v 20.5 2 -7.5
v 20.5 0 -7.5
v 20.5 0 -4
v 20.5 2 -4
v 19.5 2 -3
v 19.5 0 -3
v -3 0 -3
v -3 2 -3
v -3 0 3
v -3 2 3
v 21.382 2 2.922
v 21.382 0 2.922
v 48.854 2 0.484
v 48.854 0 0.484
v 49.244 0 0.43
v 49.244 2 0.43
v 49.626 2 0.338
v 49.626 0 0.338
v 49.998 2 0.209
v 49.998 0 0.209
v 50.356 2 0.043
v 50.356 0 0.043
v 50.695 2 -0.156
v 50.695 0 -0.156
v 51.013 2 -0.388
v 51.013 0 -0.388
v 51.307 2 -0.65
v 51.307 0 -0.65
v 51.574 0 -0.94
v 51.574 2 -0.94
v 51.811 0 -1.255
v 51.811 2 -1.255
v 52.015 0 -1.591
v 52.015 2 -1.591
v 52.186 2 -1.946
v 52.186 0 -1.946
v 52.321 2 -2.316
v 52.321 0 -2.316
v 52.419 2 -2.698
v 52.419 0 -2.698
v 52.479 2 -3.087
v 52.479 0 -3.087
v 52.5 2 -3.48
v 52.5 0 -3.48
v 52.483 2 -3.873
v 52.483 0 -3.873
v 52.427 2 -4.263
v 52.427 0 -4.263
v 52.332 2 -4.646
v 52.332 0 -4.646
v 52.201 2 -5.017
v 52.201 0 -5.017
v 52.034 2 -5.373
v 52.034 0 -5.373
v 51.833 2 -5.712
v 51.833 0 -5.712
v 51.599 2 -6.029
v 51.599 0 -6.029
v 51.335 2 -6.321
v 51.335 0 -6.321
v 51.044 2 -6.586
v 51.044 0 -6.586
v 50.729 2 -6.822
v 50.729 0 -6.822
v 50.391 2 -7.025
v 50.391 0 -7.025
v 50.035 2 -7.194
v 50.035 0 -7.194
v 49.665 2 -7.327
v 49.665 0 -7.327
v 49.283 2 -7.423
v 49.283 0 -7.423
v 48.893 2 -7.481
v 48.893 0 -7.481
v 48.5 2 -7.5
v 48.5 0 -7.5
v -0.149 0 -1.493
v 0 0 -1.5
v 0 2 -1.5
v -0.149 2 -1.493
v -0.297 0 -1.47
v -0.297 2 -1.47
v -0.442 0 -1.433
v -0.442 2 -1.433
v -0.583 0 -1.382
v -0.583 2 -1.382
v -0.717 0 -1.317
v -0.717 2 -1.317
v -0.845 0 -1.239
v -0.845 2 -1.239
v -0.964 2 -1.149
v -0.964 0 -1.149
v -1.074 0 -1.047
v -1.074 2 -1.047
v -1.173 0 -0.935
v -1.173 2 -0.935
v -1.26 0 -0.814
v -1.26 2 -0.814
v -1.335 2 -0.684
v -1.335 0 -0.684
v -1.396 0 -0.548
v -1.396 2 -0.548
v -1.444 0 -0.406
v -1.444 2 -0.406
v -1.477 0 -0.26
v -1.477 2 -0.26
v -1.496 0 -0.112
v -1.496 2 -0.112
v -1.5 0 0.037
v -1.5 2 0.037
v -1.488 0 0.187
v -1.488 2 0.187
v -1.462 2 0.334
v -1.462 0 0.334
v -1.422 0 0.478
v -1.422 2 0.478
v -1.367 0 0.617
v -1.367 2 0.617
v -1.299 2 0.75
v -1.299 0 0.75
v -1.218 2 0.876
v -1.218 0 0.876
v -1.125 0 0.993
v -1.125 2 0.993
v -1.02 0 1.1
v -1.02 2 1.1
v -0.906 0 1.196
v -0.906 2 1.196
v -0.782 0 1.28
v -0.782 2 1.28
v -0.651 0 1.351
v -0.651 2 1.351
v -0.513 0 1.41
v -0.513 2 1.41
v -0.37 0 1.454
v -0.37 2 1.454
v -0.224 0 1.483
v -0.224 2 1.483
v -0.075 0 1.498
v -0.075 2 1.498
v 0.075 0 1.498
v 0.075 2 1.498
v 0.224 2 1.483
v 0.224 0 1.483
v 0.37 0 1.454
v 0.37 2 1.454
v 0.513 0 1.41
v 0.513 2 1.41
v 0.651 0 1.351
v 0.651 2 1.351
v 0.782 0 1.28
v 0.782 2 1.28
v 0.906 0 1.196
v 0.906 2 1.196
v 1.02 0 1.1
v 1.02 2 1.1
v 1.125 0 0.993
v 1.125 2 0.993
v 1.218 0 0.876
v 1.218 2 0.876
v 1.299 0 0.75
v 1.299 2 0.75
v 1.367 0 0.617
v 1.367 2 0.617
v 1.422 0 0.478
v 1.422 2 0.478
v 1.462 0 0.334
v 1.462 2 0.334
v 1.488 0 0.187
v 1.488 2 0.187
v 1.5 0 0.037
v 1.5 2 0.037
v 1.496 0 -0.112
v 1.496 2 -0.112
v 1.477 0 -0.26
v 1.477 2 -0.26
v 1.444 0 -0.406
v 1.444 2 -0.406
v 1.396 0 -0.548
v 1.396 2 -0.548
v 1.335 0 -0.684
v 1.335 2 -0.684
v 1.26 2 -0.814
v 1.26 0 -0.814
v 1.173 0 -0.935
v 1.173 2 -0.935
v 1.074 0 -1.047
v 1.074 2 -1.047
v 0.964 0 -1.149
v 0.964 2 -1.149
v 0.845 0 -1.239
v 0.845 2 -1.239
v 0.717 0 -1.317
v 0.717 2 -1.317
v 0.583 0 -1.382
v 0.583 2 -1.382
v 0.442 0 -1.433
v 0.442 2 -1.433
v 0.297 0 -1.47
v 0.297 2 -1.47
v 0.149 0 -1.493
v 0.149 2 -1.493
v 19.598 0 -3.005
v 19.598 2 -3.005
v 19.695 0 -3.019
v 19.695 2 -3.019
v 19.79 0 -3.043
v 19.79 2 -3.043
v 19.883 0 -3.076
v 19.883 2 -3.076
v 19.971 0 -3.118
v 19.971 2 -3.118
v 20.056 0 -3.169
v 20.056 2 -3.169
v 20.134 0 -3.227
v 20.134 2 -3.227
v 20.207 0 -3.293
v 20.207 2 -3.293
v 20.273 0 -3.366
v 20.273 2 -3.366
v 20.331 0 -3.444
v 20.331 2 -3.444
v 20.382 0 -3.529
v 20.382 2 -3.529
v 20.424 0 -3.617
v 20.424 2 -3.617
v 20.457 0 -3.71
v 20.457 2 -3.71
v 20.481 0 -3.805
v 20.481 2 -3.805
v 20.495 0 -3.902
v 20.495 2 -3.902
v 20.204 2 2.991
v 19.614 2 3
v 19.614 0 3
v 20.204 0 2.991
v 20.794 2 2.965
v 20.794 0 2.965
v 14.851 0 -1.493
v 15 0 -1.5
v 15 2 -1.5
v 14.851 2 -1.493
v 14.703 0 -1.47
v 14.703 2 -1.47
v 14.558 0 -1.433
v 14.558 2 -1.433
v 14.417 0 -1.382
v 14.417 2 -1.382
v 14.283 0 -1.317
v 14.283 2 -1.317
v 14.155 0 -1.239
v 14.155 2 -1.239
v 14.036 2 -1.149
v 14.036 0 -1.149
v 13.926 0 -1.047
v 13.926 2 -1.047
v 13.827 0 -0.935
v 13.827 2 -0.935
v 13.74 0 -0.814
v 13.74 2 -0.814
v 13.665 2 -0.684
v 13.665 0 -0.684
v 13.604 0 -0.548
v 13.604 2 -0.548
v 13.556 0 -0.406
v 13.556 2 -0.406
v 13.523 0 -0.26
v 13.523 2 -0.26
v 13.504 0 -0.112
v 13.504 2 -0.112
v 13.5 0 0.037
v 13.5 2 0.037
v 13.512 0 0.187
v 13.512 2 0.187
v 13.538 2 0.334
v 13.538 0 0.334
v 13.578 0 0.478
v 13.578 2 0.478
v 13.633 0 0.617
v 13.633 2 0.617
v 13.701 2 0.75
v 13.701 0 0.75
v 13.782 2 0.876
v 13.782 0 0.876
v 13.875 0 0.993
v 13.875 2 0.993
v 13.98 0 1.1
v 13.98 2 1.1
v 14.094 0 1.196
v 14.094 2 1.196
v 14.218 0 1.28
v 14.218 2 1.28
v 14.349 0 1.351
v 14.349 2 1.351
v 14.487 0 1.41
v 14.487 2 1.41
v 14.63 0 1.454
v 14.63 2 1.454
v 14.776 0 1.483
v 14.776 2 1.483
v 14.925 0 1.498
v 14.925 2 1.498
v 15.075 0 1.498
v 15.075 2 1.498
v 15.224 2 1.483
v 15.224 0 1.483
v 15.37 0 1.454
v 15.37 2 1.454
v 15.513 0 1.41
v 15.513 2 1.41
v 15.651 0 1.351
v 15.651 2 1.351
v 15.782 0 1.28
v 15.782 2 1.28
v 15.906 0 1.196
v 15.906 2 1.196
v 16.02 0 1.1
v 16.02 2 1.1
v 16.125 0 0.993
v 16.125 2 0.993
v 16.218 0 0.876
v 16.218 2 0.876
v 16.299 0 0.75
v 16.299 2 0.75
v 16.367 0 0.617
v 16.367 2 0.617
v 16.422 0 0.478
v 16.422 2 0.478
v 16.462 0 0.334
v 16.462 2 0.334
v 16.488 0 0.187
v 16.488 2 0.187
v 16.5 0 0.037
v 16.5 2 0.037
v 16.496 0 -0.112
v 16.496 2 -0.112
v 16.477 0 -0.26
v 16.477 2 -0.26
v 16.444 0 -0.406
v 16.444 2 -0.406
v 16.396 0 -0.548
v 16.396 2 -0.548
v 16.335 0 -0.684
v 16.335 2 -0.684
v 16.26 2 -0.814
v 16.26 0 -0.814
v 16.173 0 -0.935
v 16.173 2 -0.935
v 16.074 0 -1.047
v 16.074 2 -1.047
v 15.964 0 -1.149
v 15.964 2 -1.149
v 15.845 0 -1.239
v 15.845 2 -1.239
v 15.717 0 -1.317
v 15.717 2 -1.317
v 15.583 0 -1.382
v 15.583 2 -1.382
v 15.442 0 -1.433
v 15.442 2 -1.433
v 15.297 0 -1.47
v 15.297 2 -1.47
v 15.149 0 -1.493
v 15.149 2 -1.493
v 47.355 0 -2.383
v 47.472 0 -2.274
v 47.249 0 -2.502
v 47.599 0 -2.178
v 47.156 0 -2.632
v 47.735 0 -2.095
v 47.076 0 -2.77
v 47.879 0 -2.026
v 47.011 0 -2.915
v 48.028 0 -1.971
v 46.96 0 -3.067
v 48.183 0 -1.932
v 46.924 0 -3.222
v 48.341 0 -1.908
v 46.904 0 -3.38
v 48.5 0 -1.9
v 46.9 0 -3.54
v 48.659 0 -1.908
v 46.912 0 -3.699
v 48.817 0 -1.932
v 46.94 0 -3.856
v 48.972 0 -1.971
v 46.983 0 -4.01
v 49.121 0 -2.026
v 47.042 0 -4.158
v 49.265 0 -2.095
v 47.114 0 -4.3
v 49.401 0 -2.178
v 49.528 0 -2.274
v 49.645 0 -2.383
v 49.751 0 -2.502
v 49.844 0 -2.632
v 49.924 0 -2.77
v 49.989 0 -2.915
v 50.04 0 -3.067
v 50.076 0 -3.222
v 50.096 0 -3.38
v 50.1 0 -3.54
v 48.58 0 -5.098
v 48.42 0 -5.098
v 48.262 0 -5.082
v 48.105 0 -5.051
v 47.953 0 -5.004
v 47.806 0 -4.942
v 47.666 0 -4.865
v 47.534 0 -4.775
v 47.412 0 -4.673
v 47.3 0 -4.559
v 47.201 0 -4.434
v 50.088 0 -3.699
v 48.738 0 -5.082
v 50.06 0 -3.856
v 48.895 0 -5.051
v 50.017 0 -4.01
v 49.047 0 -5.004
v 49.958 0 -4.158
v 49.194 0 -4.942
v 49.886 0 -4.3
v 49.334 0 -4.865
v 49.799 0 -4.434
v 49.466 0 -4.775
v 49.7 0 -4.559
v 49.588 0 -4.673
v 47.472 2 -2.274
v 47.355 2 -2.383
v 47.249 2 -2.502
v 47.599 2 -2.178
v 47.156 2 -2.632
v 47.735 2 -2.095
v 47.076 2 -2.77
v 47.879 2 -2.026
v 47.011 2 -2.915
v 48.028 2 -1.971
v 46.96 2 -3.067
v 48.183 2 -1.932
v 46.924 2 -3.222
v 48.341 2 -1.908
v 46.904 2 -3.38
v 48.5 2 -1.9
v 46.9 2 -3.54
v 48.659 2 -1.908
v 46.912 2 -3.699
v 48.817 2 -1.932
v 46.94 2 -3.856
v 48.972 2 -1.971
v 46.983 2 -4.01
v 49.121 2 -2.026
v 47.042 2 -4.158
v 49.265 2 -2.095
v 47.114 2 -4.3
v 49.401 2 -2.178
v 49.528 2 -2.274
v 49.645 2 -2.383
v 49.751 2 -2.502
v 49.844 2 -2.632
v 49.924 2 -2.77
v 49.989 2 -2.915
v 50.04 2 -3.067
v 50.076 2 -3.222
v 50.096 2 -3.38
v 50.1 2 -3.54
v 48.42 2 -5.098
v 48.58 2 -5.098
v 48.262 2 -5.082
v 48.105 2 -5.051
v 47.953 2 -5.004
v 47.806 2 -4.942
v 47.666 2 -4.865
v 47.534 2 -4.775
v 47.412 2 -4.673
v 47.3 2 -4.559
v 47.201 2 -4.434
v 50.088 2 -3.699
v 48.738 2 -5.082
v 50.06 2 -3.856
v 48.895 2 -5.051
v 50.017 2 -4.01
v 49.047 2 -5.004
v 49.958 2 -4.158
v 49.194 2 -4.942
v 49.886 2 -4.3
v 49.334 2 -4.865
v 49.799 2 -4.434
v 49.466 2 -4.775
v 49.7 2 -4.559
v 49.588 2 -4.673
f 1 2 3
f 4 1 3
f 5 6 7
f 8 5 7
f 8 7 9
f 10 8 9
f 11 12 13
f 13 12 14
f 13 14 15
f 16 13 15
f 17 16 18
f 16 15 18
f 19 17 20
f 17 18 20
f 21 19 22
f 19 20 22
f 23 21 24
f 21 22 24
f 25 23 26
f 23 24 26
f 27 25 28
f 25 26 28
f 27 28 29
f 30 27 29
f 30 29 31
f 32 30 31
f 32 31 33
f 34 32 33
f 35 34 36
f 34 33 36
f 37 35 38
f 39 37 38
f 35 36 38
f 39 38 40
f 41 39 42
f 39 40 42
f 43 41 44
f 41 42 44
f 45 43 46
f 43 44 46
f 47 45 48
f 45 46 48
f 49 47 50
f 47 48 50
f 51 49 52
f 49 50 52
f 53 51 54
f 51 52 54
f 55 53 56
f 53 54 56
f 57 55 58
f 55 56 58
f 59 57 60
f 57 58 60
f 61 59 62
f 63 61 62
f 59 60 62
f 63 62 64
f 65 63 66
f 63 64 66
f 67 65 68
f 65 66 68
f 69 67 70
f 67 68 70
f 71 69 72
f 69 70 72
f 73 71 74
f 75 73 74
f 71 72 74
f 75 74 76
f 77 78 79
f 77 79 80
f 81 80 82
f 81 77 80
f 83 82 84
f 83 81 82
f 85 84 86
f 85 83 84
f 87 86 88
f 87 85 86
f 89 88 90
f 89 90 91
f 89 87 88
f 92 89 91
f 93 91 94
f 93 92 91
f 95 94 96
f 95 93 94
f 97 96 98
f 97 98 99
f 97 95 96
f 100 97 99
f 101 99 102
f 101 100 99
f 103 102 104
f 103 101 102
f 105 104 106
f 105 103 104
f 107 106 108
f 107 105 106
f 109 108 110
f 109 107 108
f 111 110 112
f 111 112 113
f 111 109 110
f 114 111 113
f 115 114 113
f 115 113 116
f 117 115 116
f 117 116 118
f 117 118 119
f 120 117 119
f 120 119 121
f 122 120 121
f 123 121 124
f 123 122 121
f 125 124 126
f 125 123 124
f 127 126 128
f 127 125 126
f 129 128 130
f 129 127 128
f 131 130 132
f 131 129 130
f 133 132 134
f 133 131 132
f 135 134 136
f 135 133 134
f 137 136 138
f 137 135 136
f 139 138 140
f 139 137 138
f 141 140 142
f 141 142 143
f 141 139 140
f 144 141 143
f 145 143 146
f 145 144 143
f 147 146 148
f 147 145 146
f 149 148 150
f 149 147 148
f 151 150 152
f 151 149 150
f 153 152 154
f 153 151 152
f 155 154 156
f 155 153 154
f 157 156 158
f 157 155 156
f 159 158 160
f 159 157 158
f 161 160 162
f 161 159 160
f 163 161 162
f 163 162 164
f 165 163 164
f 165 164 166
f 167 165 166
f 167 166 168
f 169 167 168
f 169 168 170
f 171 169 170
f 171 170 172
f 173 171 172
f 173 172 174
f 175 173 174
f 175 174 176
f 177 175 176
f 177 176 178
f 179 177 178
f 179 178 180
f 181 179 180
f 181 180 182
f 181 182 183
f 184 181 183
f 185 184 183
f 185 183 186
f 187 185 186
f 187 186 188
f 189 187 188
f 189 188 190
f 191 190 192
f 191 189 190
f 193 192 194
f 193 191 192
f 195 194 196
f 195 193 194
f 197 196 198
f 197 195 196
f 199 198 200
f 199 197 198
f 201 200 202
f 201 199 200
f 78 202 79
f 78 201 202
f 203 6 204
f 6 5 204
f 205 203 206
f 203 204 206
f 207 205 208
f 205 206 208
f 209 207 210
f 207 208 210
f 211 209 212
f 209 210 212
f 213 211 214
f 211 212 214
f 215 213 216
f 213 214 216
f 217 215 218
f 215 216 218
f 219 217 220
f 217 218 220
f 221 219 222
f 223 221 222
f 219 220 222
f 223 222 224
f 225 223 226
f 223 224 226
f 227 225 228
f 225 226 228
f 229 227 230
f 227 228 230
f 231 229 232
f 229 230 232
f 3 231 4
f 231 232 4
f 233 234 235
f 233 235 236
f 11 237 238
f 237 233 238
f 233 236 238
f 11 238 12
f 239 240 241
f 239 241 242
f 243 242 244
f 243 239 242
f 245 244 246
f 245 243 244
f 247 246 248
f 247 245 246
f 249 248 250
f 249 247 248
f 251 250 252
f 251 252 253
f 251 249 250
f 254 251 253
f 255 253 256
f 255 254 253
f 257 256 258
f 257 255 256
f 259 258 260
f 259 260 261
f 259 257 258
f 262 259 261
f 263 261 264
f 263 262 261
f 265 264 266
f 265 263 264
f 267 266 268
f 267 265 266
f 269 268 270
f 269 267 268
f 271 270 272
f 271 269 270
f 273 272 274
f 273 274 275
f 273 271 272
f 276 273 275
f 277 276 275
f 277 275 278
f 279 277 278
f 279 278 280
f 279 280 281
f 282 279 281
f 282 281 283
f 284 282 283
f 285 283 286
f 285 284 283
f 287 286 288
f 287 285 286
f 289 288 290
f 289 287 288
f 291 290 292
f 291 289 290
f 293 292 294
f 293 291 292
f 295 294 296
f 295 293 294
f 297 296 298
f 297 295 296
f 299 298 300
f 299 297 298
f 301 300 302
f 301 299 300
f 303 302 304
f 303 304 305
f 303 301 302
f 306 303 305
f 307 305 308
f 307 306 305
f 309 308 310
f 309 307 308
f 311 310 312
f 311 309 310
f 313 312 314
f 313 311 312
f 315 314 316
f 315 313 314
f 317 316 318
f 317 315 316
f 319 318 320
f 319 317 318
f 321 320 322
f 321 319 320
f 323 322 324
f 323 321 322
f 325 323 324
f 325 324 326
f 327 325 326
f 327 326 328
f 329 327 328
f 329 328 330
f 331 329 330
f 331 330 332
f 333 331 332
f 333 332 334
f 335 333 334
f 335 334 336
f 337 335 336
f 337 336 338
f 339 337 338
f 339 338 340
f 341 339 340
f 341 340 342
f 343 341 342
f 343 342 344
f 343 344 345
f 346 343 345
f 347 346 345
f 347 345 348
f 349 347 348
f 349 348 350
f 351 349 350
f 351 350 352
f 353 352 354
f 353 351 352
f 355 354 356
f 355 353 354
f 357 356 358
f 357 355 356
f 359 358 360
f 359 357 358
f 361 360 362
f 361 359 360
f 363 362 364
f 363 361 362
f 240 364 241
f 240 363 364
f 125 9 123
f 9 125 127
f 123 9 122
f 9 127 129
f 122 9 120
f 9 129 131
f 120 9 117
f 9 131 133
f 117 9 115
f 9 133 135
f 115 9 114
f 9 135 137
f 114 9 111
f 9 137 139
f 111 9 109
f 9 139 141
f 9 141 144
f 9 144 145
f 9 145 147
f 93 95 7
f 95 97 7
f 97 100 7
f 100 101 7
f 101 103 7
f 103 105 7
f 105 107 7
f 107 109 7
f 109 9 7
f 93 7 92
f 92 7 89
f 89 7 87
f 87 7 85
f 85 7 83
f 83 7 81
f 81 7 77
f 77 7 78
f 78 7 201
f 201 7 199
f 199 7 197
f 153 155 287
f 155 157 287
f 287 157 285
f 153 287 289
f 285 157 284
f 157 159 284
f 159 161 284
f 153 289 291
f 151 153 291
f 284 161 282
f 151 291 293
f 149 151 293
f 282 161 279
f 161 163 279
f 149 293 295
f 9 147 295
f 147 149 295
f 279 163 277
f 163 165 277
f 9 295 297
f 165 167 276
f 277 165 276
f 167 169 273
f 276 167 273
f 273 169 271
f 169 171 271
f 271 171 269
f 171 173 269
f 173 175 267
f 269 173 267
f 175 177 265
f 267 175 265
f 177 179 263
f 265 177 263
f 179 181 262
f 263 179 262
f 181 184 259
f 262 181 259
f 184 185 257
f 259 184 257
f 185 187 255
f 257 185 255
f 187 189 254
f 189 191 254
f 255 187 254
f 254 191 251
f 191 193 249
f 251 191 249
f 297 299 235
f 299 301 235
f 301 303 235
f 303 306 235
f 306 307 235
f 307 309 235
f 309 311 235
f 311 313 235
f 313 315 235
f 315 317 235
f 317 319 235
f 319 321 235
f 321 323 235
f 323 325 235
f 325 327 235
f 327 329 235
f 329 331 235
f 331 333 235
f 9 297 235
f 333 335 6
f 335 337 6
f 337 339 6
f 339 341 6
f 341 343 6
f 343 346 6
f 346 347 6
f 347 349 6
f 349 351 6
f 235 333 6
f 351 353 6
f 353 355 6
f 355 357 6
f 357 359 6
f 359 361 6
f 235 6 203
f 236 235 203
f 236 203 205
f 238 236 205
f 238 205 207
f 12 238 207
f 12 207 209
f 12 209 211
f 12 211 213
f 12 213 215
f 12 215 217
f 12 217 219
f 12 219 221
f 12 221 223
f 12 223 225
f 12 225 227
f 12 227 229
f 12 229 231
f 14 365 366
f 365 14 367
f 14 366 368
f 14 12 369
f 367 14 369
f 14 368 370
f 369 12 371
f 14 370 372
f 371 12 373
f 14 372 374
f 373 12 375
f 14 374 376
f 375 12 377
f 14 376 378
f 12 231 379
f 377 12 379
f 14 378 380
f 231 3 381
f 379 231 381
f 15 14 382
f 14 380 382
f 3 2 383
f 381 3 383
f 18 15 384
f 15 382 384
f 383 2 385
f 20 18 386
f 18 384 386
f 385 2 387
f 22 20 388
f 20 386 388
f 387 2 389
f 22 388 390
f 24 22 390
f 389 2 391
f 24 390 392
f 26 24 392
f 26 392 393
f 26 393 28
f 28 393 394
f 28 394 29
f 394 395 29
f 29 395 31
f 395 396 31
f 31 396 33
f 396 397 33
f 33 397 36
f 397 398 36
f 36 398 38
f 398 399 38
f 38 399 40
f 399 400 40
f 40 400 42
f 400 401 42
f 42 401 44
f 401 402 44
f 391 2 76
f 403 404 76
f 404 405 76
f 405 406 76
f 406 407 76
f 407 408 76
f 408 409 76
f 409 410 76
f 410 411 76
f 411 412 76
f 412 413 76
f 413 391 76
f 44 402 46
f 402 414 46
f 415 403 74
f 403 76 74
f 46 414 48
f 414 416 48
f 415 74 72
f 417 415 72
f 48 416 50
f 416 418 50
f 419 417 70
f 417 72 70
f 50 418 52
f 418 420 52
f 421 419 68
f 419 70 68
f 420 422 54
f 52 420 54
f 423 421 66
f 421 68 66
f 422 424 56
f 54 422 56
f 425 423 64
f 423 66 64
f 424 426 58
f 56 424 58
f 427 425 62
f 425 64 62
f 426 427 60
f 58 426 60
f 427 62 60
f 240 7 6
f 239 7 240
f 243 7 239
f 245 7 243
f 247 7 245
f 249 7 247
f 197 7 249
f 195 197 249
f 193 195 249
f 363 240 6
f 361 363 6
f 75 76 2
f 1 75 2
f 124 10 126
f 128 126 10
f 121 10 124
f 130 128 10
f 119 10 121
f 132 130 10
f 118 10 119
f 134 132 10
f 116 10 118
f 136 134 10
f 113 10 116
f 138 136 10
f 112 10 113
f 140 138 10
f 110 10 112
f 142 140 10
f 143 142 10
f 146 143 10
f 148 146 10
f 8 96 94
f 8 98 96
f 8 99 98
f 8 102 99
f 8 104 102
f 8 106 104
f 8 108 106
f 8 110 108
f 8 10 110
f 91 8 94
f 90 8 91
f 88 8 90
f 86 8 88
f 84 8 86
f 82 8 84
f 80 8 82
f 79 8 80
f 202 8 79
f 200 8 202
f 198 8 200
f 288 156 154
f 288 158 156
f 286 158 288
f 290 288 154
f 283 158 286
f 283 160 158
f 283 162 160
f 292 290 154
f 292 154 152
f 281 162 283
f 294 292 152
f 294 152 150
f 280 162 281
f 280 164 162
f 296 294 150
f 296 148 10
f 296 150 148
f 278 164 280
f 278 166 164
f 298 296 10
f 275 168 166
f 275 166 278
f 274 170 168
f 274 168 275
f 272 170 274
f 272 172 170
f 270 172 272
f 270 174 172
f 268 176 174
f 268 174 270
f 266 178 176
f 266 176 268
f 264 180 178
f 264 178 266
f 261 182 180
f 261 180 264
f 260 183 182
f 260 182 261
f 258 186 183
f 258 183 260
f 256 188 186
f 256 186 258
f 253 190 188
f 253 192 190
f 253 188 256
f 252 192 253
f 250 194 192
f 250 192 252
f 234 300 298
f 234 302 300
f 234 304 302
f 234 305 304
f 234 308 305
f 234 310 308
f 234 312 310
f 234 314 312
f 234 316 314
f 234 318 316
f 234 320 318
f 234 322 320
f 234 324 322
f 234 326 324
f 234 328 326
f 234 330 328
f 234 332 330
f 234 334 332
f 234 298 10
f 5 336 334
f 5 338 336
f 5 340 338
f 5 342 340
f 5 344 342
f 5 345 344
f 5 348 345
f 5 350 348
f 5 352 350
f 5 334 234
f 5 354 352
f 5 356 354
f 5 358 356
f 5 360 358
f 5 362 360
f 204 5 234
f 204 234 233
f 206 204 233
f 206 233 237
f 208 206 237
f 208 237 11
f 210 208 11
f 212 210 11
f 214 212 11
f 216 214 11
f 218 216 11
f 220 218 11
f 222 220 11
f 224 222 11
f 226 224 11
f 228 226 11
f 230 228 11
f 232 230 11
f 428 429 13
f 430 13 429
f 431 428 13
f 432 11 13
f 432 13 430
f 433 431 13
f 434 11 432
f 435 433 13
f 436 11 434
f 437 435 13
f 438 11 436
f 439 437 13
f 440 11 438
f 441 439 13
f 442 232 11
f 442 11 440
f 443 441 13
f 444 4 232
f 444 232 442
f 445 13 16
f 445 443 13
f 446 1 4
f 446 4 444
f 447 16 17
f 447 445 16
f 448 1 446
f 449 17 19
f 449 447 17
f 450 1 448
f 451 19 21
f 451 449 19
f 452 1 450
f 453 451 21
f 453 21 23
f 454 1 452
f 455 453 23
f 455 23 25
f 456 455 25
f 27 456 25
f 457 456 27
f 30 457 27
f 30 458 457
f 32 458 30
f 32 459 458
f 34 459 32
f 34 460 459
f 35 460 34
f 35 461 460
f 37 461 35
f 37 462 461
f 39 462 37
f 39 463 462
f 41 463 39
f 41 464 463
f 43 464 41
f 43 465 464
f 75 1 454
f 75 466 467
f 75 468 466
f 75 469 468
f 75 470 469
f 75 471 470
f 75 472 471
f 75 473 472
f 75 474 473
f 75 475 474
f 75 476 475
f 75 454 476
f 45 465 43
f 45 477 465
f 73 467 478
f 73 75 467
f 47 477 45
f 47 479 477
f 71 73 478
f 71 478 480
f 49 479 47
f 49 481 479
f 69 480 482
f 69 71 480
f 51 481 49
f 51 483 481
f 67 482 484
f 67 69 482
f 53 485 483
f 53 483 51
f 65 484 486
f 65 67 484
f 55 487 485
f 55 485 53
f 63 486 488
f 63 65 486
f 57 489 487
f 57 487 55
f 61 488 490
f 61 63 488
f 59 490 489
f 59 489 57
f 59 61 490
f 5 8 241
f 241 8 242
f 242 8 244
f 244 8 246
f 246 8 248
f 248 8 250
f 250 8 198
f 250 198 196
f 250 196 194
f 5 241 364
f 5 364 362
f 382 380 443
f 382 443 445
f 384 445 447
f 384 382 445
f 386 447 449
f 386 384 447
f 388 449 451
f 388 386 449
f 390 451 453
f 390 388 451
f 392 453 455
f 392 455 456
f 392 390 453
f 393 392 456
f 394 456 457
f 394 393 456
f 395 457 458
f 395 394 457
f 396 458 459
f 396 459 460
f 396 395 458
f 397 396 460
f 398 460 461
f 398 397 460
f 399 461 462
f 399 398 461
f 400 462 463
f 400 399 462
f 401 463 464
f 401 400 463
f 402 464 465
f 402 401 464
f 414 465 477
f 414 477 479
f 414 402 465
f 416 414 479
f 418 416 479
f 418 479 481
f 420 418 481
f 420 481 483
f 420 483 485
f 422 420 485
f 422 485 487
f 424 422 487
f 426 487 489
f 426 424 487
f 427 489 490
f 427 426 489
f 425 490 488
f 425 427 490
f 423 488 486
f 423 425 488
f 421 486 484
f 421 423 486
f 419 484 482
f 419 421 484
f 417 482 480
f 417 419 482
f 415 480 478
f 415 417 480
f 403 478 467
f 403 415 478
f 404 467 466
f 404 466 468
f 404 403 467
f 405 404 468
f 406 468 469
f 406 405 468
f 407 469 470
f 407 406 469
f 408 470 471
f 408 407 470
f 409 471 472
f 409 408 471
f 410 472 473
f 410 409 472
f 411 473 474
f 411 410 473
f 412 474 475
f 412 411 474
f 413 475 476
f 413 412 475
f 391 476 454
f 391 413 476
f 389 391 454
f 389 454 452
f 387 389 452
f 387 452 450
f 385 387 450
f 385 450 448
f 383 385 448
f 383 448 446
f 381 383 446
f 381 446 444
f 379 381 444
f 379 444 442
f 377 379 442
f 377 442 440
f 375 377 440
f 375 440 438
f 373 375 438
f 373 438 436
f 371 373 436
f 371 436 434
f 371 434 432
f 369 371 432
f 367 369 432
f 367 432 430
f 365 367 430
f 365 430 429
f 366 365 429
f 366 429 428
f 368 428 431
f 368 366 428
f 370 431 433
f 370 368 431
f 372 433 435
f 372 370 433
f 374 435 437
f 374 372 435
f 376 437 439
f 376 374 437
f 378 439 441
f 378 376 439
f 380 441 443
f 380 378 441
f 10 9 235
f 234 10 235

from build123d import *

# Parameters (mm, degrees)
SKETCH_2_R      = 1.5
SKETCH_2_R_2    = 1.6
EXTRUDE_2_DEPTH = 2
FILLET_1_R      = 1
FILLET_2_R      = 20


with BuildPart() as part:
    # 草图2 → 凸台-拉伸2 (new body)
    with BuildSketch(Plane(origin=(0, 0, 0), x_dir=(1, 0, 0), z_dir=(0, 1, 0))):
        with BuildLine():
            Line((20.5, 3), (-3, 3))
            Line((-3, 3), (-3, -3))
            Line((-3, -3), (20.5, -3))
            Line((20.5, -3), (48.853509418, -0.484348264))
            ThreePointArc((48.853509418, -0.484348264), (52.49608515, 3.676927871), (48.5, 7.5))
            Line((48.5, 7.5), (20.5, 7.5))
            Line((20.5, 7.5), (20.5, 3))
        make_face()
        with Locations(Location((0, 0, 0), (0, 0, 90))):
            Circle(SKETCH_2_R, mode=Mode.SUBTRACT)
        with Locations(Location((15, 0, 0), (0, 0, 90))):
            Circle(SKETCH_2_R, mode=Mode.SUBTRACT)
        with Locations(Location((48.5, 3.5, 0), (0, 0, 270))):
            Circle(SKETCH_2_R_2, mode=Mode.SUBTRACT)
    extrude(amount=EXTRUDE_2_DEPTH)

    # 圆角1
    fillet_1_edges = [part.edges().sort_by_distance(p)[0] for p in [
        (20.5, 1, -3),
    ]]
    fillet(fillet_1_edges, radius=FILLET_1_R)

    # 圆角2
    # the kernel refuses this fillet: 20 mm, written as the material it takes off along each edge
    with BuildSketch(Plane(origin=(20.5, -2.213765024, 3), x_dir=(0.9960870660689326, 0, -0.08837735462314833), z_dir=(0, 1, 0))) as fillet_2_piece_1:
        with BuildLine():
            CenterArc((FILLET_2_R * 0.0442753004743, FILLET_2_R), FILLET_2_R, 264.929735646, 5.070264354)
            Line((-FILLET_2_R * 0.0441020541488, FILLET_2_R * 0.00391293393107), (0, 0))
            Line((0, 0), (FILLET_2_R * 0.0442753004743, 0))
        make_face()
    extrude(amount=6.427530047, mode=Mode.SUBTRACT)


solid = part.part
